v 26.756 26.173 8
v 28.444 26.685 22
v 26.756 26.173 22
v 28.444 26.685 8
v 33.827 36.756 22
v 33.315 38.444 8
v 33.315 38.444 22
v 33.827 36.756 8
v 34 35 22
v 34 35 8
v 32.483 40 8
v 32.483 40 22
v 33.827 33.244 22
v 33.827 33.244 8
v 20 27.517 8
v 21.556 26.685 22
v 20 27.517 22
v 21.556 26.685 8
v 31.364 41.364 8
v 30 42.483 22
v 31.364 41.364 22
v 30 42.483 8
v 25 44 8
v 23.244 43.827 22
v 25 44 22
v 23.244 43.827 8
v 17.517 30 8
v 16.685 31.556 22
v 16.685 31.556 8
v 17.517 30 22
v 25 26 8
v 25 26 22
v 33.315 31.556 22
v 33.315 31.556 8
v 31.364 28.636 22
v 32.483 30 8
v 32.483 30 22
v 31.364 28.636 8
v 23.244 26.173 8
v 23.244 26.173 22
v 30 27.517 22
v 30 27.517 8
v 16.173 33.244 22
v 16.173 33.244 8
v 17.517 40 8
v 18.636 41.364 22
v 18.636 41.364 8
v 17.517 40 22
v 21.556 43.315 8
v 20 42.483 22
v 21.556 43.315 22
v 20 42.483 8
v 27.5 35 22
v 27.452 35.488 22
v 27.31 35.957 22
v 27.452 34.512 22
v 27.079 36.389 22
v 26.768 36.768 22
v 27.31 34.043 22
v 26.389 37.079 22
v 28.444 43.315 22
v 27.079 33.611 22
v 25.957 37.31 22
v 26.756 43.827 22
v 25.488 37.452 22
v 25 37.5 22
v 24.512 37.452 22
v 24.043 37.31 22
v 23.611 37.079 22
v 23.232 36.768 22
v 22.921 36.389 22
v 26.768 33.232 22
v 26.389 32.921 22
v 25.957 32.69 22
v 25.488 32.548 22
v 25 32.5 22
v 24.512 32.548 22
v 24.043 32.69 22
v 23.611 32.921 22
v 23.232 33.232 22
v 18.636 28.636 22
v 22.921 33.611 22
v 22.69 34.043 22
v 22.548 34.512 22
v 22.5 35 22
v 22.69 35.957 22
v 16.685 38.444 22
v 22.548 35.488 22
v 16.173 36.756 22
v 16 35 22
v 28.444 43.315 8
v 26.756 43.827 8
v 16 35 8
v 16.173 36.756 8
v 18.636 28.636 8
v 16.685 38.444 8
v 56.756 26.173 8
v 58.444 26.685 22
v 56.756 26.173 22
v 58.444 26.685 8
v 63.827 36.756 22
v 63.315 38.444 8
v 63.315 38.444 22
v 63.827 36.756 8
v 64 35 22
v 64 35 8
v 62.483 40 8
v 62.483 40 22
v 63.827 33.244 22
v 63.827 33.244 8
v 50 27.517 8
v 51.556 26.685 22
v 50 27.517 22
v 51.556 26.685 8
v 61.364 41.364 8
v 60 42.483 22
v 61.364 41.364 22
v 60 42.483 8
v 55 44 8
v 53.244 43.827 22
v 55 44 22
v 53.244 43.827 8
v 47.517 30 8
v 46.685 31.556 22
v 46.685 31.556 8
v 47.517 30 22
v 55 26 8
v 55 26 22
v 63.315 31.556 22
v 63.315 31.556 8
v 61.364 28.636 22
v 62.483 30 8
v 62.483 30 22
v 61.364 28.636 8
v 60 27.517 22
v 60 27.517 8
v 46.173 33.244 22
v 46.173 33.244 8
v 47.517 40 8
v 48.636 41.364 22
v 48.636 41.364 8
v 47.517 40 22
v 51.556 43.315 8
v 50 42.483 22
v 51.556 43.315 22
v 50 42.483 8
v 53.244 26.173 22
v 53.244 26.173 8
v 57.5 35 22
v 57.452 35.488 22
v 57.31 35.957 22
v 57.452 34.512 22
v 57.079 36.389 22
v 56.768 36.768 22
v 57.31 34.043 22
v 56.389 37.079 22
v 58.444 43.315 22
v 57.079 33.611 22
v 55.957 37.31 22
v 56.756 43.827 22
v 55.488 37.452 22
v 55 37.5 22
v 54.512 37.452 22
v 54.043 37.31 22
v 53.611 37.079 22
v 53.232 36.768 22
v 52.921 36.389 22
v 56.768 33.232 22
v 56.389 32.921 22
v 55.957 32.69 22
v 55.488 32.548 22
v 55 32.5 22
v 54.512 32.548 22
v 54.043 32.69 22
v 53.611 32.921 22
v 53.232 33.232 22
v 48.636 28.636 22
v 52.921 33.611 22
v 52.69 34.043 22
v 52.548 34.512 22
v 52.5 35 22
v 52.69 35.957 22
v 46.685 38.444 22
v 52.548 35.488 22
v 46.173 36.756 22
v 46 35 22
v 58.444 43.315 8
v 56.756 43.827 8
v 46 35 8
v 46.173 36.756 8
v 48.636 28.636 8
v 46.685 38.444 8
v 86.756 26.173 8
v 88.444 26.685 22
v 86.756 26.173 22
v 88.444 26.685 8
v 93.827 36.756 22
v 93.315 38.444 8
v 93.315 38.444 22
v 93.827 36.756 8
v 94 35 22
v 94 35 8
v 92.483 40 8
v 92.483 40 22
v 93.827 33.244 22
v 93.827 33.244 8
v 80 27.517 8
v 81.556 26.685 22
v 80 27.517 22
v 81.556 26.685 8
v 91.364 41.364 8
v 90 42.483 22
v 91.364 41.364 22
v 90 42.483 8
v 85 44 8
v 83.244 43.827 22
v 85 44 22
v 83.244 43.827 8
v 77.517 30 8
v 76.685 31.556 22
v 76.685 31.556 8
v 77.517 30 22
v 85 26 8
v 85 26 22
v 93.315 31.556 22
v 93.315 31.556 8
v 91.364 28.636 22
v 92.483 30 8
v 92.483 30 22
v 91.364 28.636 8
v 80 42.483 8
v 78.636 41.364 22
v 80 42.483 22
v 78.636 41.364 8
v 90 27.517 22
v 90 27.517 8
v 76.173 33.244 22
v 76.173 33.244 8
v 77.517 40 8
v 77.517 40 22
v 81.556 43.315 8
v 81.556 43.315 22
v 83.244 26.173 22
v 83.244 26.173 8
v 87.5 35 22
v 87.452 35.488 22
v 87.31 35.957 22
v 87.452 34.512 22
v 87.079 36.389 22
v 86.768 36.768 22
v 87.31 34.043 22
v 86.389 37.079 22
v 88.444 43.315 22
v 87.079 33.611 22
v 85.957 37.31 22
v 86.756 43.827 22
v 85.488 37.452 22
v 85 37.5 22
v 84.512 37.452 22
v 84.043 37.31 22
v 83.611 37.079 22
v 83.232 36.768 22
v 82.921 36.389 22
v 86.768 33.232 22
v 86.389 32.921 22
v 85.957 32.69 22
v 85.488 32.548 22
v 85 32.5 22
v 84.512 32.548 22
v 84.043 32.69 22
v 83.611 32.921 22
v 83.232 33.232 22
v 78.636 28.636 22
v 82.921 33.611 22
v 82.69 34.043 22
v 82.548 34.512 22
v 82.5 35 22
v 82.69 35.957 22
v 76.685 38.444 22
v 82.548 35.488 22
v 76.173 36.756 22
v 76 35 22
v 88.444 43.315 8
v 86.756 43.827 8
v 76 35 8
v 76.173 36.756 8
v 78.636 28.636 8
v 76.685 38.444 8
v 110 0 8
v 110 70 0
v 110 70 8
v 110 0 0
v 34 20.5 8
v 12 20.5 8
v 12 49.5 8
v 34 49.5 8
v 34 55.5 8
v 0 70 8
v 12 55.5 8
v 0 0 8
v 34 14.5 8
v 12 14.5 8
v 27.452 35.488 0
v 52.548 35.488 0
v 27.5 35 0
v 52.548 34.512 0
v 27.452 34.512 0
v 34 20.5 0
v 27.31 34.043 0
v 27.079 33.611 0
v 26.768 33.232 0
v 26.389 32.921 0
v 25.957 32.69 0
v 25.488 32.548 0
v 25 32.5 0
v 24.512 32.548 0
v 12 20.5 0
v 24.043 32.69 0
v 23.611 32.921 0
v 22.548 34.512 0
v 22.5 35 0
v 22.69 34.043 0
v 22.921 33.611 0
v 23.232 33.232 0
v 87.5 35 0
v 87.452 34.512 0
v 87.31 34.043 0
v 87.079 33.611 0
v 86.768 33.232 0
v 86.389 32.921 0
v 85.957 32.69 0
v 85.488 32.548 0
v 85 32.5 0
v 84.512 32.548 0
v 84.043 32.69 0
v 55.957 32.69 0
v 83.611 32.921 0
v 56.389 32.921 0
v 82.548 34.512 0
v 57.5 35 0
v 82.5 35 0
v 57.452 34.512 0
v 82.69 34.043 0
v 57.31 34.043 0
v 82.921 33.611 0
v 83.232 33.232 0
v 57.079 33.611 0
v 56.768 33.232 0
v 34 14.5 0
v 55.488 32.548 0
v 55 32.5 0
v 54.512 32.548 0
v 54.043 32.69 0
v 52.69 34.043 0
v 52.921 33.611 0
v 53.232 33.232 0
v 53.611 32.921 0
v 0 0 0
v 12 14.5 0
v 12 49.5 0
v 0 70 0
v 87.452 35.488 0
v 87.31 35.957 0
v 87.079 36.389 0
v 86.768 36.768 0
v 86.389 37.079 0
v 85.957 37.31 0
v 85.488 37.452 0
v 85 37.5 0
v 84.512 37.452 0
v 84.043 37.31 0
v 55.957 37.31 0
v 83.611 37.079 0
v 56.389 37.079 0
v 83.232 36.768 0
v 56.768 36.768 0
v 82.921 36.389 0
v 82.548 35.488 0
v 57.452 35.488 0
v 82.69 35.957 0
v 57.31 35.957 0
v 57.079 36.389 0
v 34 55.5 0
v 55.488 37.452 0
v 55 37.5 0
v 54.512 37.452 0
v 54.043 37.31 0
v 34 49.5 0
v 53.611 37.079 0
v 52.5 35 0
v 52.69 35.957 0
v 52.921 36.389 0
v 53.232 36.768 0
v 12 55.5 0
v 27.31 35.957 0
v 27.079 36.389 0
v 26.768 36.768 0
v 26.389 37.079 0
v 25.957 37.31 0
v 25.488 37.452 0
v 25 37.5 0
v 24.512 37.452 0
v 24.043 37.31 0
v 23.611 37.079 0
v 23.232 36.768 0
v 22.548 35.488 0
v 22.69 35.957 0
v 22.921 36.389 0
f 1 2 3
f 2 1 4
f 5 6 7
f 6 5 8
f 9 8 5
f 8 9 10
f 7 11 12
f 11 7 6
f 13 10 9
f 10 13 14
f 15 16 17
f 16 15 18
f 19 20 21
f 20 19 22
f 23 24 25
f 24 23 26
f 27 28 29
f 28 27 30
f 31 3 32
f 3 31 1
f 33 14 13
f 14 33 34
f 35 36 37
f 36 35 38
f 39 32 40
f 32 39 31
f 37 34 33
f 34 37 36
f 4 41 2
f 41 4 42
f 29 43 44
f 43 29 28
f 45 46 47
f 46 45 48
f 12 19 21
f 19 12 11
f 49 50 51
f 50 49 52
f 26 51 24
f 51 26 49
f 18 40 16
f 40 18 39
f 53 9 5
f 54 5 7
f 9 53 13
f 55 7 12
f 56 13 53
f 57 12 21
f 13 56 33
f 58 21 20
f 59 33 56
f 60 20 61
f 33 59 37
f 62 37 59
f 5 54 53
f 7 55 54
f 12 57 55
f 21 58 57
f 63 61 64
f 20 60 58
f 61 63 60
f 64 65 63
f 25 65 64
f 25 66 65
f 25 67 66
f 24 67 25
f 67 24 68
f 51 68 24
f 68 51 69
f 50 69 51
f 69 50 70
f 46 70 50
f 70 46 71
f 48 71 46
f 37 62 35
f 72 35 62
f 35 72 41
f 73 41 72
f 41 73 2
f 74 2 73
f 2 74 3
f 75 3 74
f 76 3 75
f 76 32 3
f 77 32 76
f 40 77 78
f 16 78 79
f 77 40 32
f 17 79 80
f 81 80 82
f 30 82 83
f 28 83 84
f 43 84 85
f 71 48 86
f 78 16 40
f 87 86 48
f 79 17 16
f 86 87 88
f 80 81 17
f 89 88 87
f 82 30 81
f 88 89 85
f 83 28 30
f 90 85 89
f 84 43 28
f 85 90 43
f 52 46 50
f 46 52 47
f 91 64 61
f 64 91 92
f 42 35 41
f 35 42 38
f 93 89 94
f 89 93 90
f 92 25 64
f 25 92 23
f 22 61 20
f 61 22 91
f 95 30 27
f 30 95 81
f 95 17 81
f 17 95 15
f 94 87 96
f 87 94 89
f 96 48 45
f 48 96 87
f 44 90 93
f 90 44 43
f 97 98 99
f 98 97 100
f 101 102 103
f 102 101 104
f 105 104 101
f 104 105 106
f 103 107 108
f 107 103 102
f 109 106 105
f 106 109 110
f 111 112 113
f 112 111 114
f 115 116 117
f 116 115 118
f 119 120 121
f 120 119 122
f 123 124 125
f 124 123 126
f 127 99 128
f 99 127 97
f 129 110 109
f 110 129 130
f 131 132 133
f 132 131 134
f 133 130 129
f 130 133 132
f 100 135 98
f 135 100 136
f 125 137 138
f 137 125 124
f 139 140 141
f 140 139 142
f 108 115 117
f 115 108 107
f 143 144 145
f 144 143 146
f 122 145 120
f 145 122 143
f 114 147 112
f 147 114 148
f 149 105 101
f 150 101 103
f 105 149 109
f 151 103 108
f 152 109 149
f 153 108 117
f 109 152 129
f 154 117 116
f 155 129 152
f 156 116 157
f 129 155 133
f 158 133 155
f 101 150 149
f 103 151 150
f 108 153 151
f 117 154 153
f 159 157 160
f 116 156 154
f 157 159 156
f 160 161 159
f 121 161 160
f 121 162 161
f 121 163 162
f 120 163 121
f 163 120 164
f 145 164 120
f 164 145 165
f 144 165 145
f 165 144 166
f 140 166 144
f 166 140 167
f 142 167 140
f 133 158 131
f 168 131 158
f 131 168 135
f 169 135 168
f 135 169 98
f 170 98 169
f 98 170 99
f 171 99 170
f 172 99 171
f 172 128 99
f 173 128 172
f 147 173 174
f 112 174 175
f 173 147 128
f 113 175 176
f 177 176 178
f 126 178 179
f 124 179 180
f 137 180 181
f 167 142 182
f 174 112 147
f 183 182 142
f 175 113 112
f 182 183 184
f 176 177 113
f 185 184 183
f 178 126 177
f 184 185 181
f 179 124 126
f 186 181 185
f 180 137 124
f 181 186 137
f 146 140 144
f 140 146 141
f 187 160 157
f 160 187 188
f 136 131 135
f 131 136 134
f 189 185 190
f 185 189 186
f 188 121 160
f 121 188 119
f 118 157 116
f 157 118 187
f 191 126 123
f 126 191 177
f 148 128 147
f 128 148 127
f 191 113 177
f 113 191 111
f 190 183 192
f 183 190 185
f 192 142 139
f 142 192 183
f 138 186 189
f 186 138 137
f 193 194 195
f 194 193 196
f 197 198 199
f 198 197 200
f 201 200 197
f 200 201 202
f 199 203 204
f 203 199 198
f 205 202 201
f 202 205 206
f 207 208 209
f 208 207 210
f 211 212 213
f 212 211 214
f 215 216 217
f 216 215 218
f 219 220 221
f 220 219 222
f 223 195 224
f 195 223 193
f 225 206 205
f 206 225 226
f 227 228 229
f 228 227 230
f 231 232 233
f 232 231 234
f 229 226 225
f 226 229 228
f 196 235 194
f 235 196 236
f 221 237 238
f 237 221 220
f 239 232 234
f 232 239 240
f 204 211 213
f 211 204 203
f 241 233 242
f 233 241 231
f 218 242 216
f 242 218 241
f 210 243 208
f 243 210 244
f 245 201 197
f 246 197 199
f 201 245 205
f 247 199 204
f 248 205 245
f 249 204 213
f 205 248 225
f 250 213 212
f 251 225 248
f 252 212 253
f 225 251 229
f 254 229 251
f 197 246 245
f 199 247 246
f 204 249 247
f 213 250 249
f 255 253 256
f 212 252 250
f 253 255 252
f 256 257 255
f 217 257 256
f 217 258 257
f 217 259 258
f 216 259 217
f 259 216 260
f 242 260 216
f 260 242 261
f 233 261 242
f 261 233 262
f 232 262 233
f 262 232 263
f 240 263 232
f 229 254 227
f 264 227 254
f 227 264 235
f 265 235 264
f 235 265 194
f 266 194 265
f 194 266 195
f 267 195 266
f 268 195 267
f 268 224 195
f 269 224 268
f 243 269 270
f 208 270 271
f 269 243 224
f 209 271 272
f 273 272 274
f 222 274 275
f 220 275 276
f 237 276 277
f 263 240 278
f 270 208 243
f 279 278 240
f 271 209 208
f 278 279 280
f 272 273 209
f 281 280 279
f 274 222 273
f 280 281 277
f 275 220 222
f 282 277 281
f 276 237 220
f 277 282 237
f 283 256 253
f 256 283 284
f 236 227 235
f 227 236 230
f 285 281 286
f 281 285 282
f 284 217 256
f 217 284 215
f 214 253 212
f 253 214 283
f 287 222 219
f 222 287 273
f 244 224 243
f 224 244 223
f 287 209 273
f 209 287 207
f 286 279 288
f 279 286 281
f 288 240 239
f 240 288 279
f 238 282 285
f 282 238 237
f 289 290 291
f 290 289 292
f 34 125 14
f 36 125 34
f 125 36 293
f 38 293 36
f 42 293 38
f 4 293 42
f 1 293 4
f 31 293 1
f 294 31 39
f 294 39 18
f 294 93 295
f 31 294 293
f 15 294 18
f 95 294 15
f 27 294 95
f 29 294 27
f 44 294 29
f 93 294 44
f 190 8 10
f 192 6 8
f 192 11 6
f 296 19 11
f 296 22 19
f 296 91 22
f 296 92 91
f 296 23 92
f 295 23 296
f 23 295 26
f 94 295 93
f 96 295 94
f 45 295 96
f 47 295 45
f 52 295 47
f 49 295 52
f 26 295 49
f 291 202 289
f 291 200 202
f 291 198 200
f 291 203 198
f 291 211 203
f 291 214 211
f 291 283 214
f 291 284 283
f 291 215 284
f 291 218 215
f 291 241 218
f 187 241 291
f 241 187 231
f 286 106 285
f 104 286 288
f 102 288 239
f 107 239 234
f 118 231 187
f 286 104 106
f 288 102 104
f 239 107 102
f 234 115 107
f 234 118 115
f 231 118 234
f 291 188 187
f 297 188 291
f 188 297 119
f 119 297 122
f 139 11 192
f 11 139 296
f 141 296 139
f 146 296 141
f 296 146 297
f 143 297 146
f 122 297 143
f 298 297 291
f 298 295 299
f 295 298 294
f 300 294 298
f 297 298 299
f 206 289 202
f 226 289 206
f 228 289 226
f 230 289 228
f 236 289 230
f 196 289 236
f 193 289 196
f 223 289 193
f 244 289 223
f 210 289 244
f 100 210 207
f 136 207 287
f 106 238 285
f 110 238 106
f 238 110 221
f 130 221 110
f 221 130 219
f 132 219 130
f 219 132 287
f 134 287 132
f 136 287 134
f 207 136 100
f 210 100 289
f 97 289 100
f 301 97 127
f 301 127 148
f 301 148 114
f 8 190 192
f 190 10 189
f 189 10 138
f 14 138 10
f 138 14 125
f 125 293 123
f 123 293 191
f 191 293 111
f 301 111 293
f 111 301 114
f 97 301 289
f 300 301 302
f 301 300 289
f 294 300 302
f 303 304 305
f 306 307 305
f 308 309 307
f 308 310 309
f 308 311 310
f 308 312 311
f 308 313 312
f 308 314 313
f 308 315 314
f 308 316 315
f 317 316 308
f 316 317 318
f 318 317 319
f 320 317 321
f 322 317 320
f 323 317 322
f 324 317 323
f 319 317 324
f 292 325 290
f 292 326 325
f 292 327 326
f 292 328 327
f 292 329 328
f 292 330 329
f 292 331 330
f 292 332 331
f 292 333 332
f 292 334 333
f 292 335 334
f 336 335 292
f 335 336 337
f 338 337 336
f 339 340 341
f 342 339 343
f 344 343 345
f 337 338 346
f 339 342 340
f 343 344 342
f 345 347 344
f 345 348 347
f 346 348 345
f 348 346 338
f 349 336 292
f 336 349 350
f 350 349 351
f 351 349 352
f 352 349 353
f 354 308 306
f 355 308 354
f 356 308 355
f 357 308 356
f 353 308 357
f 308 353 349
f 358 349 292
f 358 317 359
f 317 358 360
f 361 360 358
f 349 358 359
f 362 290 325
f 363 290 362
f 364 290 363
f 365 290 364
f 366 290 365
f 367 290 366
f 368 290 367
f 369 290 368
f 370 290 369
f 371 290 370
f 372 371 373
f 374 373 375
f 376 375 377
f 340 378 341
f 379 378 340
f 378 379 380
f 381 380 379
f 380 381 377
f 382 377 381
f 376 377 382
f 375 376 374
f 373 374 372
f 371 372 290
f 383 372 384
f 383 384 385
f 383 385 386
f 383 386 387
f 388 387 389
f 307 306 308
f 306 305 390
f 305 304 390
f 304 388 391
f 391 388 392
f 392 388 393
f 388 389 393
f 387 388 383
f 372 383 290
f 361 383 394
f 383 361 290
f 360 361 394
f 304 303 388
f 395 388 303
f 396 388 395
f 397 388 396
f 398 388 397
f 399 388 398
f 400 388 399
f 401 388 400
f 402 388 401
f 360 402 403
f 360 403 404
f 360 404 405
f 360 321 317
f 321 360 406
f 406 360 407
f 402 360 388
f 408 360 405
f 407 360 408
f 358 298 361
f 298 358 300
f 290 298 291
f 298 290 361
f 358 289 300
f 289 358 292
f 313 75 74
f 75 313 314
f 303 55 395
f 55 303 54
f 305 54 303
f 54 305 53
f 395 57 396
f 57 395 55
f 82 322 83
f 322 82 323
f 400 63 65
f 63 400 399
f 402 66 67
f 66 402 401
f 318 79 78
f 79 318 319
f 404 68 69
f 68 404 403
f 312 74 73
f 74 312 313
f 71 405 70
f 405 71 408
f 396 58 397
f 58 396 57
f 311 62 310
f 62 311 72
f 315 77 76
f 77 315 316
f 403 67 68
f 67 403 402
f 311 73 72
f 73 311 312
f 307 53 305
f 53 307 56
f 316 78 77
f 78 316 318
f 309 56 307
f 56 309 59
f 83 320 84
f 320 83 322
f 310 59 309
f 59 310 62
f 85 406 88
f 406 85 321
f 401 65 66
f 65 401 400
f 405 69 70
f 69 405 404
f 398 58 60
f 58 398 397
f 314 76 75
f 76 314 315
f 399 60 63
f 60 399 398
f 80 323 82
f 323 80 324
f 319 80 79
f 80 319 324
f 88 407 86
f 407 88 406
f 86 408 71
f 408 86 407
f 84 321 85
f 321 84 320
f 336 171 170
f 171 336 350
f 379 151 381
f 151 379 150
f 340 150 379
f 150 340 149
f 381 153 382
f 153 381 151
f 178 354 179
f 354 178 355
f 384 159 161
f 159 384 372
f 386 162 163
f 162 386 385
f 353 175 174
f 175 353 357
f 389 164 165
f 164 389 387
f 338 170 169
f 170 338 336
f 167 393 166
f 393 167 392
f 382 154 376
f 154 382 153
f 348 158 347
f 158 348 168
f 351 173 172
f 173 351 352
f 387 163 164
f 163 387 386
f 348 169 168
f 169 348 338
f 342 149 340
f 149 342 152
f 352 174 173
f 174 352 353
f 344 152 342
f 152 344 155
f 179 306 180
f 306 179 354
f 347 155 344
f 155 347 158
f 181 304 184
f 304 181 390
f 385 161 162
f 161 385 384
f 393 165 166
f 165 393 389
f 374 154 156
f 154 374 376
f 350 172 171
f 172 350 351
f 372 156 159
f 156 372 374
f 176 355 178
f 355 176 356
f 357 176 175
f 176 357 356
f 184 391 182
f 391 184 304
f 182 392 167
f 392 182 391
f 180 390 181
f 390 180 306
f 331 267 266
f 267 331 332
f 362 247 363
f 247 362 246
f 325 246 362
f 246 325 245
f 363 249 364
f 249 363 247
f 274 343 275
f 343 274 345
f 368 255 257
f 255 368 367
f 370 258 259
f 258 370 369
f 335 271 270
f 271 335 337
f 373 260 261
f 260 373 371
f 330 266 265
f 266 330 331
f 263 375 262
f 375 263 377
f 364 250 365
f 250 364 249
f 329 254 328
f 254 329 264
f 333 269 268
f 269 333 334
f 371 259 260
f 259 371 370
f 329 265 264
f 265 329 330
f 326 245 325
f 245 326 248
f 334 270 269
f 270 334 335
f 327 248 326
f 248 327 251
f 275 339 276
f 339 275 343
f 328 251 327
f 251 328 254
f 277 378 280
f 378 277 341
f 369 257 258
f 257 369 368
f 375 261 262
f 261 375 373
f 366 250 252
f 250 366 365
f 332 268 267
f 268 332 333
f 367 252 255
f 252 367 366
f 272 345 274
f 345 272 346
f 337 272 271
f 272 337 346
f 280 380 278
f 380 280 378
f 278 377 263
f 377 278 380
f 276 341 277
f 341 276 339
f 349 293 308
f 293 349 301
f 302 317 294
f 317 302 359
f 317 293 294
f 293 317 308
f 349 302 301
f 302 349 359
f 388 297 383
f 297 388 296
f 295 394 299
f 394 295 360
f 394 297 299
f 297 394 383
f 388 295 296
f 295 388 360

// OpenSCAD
$fn = 32;

// ----------------------------------------------------------------------
// Drill jig: three_boss_slot jig
// ----------------------------------------------------------------------

// --- parameters (mm) ---
plate_l = 110;            // plate length, X
plate_w = 70;             // plate width, Y
plate_t = 8;              // plate thickness
boss_d = 18;              // guide boss diameter
boss_h = 15;              // boss height above the plate
guide_d = 5;              // guide hole diameter
boss_pitch = 30;          // boss pitch
slot_w = 6;               // clamp slot width
slot_l = 22;              // clamp slot length
slot_x = 12;              // slot start X
fit_tol = 0.02;           // tolerance for press fits, mm
free_tol = 0.2;           // tolerance for clearance fits, mm

n_boss = 3;  // guide bosses
boss_x0 = (plate_l - (n_boss - 1) * boss_pitch) / 2;  // first boss X
boss_top = plate_t - 1 + boss_h;  // boss crown height
total_h = boss_top;  // overall height

difference() {
  union() {
  cube([plate_l, plate_w, plate_t]);
  for (i = [0 : n_boss - 1])
    translate([boss_x0 + i * boss_pitch, plate_w / 2, plate_t - 1])
      cylinder(h = boss_h, d = boss_d);
  }
  for (i = [0 : n_boss - 1])
    translate([boss_x0 + i * boss_pitch, plate_w / 2, -1])
      cylinder(h = plate_t + boss_h, d = guide_d);
  for (cy = [plate_w * 0.25, plate_w * 0.75])
    translate([slot_x, cy - slot_w / 2, -1])
      cube([slot_l, slot_w, plate_t + 2]);
}
